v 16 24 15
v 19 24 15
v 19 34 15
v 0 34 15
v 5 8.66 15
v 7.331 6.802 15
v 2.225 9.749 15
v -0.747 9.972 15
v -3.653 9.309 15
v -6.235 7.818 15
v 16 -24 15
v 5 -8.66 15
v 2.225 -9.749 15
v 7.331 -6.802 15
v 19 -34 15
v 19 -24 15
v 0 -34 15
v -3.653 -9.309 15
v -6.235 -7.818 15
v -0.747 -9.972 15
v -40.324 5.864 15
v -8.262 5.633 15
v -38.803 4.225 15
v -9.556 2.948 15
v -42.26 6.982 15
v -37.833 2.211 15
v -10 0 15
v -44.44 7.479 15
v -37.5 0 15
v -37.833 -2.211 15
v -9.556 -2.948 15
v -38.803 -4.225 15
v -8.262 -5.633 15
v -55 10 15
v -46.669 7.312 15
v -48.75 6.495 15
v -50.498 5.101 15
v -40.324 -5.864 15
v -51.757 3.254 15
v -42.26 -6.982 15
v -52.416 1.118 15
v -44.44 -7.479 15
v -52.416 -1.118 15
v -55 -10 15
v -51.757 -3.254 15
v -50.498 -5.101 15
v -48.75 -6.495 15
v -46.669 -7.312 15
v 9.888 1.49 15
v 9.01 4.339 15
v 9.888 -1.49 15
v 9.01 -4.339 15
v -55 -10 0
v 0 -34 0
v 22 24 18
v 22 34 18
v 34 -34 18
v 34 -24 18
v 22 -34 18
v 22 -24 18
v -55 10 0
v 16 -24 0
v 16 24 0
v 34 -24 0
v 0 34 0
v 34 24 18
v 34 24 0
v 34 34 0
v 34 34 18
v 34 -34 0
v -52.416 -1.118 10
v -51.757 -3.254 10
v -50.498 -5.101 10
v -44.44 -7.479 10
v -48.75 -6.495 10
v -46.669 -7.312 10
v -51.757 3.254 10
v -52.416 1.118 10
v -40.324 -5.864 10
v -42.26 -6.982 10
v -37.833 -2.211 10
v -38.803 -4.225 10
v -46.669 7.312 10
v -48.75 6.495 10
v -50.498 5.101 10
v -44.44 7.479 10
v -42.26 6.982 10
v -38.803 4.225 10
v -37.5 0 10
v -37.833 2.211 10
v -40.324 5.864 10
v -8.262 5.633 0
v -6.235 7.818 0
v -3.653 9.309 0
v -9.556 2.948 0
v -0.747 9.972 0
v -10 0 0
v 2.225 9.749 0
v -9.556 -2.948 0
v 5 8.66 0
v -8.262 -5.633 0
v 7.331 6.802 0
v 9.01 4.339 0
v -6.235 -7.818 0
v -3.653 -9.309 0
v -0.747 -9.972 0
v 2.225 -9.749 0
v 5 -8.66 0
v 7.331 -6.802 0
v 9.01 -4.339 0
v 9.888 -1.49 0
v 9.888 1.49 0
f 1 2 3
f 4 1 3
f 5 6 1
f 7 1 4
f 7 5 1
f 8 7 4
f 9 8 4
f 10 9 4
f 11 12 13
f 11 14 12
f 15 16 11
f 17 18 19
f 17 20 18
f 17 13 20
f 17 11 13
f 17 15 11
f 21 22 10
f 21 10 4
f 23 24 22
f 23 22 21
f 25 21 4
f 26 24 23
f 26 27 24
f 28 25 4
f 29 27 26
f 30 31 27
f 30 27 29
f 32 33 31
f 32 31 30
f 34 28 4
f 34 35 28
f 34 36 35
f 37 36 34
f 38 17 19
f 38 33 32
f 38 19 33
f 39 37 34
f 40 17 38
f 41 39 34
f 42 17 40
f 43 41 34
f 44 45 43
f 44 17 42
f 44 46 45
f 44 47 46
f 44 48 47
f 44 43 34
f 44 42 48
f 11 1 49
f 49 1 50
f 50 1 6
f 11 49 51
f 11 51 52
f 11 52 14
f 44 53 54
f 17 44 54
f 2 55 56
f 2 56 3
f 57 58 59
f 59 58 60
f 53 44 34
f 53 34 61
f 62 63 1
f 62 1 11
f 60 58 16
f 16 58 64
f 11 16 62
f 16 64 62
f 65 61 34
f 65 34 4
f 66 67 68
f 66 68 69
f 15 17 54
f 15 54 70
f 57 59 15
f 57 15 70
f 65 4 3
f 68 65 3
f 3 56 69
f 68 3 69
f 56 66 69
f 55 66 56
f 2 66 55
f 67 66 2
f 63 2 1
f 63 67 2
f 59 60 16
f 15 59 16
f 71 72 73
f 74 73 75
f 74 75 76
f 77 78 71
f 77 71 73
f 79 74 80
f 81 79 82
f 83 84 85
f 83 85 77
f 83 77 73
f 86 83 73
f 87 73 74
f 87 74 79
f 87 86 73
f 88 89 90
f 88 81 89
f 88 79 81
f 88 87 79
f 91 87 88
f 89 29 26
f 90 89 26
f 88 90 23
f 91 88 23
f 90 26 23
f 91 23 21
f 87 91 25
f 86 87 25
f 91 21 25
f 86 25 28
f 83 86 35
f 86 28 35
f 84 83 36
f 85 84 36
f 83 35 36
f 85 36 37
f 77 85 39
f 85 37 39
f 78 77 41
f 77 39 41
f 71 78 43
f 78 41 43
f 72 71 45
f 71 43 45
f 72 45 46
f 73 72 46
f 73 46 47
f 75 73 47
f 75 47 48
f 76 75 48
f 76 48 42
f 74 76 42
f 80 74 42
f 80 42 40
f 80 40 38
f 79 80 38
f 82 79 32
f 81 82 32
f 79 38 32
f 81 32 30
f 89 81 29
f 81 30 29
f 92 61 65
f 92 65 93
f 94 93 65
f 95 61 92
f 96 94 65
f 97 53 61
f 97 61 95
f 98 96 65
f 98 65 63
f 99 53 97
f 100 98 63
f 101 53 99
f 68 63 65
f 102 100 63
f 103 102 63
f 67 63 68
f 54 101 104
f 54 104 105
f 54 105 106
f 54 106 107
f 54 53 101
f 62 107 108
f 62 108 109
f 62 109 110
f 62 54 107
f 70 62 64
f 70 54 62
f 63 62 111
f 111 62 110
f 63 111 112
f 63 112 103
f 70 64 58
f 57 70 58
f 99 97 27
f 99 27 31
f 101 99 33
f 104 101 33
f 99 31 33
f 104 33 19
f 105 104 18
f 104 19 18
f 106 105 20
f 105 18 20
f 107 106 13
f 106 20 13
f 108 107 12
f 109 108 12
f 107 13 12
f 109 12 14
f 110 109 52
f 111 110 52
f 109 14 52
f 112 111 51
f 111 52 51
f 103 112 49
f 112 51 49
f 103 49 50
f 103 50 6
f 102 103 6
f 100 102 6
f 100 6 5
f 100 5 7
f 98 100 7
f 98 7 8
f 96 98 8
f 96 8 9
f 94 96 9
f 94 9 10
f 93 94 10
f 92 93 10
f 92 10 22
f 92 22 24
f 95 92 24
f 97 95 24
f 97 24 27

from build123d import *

# Parameters (mm, degrees)
F3_DEPTH = 34
F4_DEPTH = 18.001
F6_D     = 20
F7_R     = 7.5
F8_DEPTH = 5


with BuildPart() as f3:
    # F0 (on Front) → F3 (new body)
    with BuildSketch(Plane.XZ):
        Polygon((-55, 15), (-55, 0), (34, 0), (34, 18), (22, 18), (19, 15), align=None)
    extrude(amount=F3_DEPTH)

    # F1 (on Top) → F4 (intersect, through all)
    with BuildSketch(Plane.XY):
        Polygon((16, 0), (-55, 0), (-55, -10), (0, -34), (34, -34), (34, -24), (16, -24), align=None)
    extrude(amount=F4_DEPTH, mode=Mode.INTERSECT)

    # F5: F3 across plane


with BuildPart() as f3_1:
    add(f3.part)
    add(f3.part.mirror(Plane.XZ))

    # F6 (through all)
    with Locations(Plane(origin=(0, 0, 0), x_dir=(1, 0, 0), z_dir=(0, 0, -1))):
        with Locations((0, 0)):
            Hole(F6_D / 2)

    # F7 (on face) → F8 (cut)
    with BuildSketch(Plane.XY.offset(15)):
        with Locations((-45, 0)):
            Circle(F7_R)
    extrude(amount=-F8_DEPTH, mode=Mode.SUBTRACT)


solid = f3_1.part
